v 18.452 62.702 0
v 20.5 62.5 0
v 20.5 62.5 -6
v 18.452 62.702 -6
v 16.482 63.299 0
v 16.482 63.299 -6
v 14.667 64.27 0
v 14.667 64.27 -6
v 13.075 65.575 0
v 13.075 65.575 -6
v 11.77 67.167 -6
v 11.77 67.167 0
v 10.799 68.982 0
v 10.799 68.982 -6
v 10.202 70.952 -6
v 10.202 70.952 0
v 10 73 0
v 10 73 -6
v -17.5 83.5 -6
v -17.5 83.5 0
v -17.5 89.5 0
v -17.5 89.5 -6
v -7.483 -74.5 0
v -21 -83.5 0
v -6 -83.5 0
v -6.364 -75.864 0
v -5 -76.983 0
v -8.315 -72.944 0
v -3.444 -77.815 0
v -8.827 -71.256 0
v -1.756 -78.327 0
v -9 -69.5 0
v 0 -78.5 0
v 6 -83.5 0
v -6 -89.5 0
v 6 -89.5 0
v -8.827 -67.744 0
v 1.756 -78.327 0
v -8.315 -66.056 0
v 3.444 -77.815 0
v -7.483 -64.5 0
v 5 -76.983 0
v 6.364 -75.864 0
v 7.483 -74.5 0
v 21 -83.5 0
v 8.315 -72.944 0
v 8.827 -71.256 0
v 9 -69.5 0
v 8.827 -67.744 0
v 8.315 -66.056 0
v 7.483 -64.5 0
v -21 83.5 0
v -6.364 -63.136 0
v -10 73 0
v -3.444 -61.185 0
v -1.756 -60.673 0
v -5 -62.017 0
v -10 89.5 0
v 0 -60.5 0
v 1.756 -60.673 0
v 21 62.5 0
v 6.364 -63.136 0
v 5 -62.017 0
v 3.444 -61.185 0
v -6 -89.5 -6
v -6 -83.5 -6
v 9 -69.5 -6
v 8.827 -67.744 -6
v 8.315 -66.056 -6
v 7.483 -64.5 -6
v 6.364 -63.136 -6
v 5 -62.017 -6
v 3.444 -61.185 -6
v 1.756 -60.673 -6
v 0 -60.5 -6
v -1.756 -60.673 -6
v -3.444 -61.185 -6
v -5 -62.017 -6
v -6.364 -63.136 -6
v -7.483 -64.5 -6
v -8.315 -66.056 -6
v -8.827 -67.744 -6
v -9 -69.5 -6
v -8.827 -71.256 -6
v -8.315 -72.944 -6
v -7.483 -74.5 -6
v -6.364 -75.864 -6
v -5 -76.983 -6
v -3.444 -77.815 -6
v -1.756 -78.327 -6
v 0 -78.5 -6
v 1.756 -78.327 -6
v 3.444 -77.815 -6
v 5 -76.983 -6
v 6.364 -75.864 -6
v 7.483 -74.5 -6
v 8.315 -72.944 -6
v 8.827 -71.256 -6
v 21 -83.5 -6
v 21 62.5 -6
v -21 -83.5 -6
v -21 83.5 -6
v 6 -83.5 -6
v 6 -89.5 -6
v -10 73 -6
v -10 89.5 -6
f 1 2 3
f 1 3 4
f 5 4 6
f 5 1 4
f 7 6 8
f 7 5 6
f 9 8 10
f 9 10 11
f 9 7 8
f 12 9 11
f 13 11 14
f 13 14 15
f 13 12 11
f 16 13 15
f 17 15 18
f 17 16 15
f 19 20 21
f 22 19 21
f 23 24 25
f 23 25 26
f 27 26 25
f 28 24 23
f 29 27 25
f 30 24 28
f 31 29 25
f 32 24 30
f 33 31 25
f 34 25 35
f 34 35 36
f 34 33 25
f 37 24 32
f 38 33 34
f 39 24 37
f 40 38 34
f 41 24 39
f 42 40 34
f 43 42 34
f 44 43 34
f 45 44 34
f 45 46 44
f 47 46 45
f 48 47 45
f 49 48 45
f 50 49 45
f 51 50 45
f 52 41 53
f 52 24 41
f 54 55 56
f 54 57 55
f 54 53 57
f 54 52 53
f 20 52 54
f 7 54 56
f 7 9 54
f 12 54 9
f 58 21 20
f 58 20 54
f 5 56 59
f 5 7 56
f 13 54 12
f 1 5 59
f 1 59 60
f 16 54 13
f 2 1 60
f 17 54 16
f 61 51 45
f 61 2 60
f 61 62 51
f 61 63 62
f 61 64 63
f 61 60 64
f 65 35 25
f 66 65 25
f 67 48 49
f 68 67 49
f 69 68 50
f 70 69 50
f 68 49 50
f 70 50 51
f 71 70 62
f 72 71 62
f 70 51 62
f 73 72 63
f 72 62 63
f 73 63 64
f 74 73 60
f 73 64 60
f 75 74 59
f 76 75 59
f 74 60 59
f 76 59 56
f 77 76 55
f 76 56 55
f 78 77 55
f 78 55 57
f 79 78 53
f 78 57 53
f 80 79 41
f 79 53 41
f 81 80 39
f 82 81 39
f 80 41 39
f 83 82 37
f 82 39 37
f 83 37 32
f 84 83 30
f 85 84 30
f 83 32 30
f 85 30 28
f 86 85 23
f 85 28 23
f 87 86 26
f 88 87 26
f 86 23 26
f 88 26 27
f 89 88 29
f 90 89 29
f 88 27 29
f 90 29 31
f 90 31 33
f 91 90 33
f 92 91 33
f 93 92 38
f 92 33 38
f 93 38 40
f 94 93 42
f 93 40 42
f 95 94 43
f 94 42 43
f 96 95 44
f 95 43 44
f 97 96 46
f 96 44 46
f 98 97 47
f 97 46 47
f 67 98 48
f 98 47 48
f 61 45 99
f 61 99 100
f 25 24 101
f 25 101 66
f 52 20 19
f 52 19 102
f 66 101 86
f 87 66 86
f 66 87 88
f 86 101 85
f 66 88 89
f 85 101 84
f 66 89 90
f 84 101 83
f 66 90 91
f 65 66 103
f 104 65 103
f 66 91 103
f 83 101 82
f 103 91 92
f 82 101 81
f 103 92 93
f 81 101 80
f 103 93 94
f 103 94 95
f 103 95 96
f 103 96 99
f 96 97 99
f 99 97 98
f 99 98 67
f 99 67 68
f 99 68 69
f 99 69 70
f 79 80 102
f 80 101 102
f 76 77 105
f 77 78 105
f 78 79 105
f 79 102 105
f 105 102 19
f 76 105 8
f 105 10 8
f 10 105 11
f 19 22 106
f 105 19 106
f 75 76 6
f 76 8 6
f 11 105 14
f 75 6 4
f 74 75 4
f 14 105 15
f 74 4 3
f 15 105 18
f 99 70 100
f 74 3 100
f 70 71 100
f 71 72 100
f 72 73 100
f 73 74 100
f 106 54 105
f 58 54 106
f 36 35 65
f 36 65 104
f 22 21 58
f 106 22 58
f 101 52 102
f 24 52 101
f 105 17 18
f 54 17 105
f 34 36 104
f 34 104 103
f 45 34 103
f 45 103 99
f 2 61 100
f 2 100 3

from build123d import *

# Parameters (mm, degrees)
SKETCH1_R           = 9
SKETCH1_W           = 6
SKETCH1_H           = 6
SKETCH1_W_2         = 7.5
BOSS_EXTRUDE1_DEPTH = 6


with BuildPart() as part:
    # Sketch1 → Boss-Extrude1 (new body)
    with BuildSketch(Plane.XY):
        with BuildLine():
            ThreePointArc((20.5, 62.5), (13.075378798, 65.575378798), (10, 73))
            Line((10, 73), (-10, 73))
            Line((-10, 73), (-10, 83.5))
            Line((-10, 83.5), (-17.5, 83.5))
            Line((-17.5, 83.5), (-21, 83.5))
            Line((-21, 83.5), (-21, -83.5))
            Line((-21, -83.5), (-6, -83.5))
            Line((-6, -83.5), (0, -83.5))
            Line((0, -83.5), (6, -83.5))
            Line((6, -83.5), (21, -83.5))
            Line((21, -83.5), (21, 62.5))
            Line((21, 62.5), (20.5, 62.5))
        make_face()
        with Locations((0, -69.5)):
            Circle(SKETCH1_R, mode=Mode.SUBTRACT)
        with Locations((3, -86.5)):
            Rectangle(SKETCH1_W, SKETCH1_H)
        with Locations((-3, -86.5)):
            Rectangle(SKETCH1_W, SKETCH1_H)
        with Locations((-13.75, 86.5)):
            Rectangle(SKETCH1_W_2, SKETCH1_H)
    extrude(amount=-BOSS_EXTRUDE1_DEPTH)


solid = part.part
